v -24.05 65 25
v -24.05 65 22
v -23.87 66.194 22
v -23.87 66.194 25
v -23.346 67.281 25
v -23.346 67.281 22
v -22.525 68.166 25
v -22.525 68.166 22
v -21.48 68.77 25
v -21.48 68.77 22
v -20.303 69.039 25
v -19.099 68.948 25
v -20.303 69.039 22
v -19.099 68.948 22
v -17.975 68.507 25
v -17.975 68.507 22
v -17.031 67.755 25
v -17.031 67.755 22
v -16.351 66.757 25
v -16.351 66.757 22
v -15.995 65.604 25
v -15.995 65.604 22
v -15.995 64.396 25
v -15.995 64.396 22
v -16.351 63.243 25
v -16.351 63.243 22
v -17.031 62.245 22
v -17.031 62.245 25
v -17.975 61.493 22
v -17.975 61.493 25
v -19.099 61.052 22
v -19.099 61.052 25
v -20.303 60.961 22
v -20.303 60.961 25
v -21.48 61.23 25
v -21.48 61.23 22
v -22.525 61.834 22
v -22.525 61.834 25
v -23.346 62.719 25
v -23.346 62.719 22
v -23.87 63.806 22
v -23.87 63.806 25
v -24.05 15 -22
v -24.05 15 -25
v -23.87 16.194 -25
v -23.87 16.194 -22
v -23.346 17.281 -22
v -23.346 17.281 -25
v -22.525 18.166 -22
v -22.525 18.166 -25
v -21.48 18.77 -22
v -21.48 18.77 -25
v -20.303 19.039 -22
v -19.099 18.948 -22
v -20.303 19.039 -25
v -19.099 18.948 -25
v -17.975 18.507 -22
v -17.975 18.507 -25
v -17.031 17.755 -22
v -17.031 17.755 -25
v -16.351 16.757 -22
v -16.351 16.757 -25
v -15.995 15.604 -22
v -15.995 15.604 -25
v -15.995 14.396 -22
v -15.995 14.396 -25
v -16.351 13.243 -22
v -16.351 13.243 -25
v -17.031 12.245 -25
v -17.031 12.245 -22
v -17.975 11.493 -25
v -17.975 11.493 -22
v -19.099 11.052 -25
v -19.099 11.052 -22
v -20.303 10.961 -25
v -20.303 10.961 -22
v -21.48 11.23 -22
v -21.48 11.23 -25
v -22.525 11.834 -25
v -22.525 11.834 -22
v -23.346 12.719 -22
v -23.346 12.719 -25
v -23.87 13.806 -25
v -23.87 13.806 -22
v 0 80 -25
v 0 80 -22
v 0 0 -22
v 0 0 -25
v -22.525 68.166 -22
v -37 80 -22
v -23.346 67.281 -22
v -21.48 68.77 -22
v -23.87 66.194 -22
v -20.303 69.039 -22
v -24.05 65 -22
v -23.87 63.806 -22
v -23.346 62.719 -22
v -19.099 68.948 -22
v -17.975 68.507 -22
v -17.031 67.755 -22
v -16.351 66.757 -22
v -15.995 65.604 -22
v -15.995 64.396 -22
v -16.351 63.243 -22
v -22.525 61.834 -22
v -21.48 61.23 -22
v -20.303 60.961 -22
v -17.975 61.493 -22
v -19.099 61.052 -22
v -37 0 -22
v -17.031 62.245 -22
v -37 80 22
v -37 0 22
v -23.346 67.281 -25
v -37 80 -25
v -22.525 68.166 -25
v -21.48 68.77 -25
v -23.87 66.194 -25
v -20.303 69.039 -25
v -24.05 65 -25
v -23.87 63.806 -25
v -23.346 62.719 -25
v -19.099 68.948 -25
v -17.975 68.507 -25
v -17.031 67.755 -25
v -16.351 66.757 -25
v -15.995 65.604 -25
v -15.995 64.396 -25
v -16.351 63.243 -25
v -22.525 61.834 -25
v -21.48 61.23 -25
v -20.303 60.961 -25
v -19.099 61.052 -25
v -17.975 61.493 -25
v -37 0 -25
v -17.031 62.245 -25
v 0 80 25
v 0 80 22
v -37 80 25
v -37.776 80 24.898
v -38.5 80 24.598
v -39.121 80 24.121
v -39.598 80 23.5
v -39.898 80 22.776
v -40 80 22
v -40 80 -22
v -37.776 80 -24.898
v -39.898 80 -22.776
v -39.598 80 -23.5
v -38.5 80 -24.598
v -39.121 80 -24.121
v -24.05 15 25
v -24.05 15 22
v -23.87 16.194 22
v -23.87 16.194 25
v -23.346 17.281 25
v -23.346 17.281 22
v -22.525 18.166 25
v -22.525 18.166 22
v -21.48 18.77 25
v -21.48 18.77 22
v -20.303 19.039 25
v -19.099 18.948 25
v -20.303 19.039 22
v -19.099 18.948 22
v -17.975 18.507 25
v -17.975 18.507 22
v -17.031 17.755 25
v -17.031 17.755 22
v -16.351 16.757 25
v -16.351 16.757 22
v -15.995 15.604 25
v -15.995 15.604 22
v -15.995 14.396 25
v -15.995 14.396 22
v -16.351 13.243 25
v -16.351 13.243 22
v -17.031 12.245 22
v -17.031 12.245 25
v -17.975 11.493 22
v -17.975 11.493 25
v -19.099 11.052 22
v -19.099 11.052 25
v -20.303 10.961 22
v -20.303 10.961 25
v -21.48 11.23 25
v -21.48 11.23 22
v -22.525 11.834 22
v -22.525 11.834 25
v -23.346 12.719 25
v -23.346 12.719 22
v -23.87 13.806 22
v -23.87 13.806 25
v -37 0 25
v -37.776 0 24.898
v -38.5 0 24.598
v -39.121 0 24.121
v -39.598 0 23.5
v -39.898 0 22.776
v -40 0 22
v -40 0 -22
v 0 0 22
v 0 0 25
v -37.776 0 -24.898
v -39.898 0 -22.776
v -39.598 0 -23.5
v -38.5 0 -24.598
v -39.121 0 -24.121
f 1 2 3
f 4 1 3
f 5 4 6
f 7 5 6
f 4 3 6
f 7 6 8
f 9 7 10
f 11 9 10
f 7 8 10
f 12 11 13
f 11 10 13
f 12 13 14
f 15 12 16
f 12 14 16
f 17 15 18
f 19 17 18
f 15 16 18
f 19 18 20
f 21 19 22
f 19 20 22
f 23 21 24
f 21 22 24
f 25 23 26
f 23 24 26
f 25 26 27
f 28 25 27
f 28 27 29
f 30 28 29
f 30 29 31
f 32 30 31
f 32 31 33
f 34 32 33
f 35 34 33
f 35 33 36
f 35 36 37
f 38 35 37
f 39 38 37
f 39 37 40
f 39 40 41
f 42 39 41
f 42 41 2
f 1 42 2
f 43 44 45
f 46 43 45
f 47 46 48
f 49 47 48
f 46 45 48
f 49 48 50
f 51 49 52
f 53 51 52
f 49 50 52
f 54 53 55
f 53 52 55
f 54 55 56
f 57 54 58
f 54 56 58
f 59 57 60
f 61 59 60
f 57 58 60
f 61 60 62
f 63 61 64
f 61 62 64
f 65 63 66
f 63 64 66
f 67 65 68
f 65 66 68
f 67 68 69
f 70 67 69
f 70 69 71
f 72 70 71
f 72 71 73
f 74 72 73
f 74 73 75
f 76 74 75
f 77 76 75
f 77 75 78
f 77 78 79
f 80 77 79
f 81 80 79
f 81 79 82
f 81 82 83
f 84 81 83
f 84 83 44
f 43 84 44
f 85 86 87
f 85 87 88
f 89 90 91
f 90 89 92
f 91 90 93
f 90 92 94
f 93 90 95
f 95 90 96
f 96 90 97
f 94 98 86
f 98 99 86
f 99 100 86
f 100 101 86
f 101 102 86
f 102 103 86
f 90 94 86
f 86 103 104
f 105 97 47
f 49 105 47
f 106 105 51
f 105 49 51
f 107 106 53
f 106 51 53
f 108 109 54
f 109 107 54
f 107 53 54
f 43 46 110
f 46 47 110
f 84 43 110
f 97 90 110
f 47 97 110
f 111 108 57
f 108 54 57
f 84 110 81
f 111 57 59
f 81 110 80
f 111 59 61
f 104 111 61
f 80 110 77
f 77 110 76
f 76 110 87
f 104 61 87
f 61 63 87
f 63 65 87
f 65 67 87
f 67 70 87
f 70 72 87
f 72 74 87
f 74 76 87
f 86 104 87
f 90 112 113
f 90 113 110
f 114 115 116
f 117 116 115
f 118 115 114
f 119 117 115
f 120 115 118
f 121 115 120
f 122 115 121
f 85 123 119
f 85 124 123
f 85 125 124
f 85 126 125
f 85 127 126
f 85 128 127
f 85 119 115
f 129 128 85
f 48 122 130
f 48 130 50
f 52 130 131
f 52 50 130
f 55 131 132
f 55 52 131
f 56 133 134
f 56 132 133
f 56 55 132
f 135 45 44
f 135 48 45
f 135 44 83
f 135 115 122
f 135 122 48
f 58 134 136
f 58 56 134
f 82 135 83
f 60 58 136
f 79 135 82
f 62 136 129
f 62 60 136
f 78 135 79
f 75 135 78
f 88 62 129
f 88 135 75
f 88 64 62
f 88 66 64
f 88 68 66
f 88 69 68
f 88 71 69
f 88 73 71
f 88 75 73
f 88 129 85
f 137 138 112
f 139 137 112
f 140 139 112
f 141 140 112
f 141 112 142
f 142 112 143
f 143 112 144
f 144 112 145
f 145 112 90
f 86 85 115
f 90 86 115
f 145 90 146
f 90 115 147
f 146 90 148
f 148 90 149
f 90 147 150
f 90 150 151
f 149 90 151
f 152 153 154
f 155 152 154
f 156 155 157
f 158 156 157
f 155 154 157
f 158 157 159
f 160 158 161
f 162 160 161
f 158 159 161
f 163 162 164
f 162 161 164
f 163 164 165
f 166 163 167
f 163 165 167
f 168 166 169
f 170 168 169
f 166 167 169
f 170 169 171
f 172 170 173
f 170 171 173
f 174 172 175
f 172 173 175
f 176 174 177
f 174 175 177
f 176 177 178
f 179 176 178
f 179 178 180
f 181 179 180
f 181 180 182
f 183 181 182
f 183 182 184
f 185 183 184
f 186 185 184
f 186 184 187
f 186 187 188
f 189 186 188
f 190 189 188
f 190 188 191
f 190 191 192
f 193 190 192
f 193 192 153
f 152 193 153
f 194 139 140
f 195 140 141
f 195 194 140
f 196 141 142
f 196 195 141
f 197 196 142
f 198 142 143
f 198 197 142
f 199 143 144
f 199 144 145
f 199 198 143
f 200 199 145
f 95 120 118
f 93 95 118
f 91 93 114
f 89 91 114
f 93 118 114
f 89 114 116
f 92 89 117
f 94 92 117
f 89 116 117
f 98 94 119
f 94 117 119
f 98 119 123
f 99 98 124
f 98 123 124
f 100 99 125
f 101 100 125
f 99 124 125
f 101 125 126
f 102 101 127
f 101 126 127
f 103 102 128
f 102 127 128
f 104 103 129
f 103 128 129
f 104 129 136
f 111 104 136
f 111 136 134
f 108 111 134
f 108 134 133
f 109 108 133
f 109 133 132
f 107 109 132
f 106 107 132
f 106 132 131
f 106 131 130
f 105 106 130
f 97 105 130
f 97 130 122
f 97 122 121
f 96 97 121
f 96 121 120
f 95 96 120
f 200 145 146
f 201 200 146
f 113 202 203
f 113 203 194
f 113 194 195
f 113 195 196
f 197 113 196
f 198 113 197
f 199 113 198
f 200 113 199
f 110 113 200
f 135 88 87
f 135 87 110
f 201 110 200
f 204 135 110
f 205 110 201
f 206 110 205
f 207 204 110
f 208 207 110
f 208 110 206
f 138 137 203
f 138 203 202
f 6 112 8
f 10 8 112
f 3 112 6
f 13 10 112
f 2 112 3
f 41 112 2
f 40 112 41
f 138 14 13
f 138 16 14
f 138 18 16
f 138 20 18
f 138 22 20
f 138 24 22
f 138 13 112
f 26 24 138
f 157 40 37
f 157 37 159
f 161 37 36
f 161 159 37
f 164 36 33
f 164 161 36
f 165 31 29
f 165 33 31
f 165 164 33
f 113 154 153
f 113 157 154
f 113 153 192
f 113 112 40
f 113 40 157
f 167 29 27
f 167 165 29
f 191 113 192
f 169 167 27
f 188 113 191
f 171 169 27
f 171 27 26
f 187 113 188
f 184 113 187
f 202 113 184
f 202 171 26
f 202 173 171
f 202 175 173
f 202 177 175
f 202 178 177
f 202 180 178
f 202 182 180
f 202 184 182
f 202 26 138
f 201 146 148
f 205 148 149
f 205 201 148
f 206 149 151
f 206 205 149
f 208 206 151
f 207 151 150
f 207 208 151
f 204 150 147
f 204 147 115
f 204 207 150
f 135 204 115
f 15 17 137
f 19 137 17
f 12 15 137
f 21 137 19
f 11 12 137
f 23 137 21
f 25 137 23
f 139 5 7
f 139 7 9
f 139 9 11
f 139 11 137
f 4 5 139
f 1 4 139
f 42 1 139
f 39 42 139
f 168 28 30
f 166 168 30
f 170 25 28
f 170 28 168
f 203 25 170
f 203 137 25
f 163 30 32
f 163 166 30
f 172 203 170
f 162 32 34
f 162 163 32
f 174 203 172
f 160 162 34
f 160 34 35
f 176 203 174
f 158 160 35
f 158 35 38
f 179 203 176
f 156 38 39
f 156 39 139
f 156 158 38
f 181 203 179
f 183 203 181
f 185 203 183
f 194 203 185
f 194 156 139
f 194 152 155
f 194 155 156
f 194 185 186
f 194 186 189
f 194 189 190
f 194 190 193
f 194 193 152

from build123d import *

# Parameters (mm, degrees)
SKETCH_1_W          = 74
SKETCH_1_H          = 44
EXTRUDE_1_DEPTH     = 80
SKETCH_2_W          = 41.146480438
SKETCH_2_H          = 58.393385187
CUT_EXTRUDE_1_DEPTH = 81
SKETCH_3_R          = 4.05
CUT_EXTRUDE_2_DEPTH = 51


with BuildPart() as part:
    # Эскиз1 → Вытянуть-Тонкостенный1 (new body)
    with BuildSketch(Plane(origin=(0, 0, 0), x_dir=(1, 0, 0), z_dir=(0, 1, 0))):
        with BuildLine():
            Line((40, 22), (40, -22))
            ThreePointArc((40, -22), (39.121320344, -24.121320344), (37, -25))
            Line((37, -25), (-37, -25))
            ThreePointArc((-37, -25), (-39.121320344, -24.121320344), (-40, -22))
            Line((-40, -22), (-40, 22))
            ThreePointArc((-40, 22), (-39.121320344, 24.121320344), (-37, 25))
            Line((-37, 25), (37, 25))
            ThreePointArc((37, 25), (39.121320344, 24.121320344), (40, 22))
        make_face()
        Rectangle(SKETCH_1_W, SKETCH_1_H, mode=Mode.SUBTRACT)
    extrude(amount=EXTRUDE_1_DEPTH)

    # Эскиз2 → Вырез-Вытянуть1 (cut, through all)
    with BuildSketch(Plane(origin=(0, 80, 0), x_dir=(1, 0, 0), z_dir=(0, 1, 0))):
        with Locations((20.573240219, 1.776081122)):
            Rectangle(SKETCH_2_W, SKETCH_2_H)
    extrude(amount=-CUT_EXTRUDE_1_DEPTH, mode=Mode.SUBTRACT)

    # Эскиз3 → Вырез-Вытянуть2 (cut, through all)
    with BuildSketch(Plane(origin=(0, 0, -25), x_dir=(-1, 0, 0), z_dir=(0, 0, -1))):
        with Locations((20, 115)):
            Circle(SKETCH_3_R)
        with Locations((20, 15)):
            Circle(SKETCH_3_R)
        with Locations((20, 65)):
            Circle(SKETCH_3_R)
    extrude(amount=-CUT_EXTRUDE_2_DEPTH, mode=Mode.SUBTRACT)


solid = part.part
